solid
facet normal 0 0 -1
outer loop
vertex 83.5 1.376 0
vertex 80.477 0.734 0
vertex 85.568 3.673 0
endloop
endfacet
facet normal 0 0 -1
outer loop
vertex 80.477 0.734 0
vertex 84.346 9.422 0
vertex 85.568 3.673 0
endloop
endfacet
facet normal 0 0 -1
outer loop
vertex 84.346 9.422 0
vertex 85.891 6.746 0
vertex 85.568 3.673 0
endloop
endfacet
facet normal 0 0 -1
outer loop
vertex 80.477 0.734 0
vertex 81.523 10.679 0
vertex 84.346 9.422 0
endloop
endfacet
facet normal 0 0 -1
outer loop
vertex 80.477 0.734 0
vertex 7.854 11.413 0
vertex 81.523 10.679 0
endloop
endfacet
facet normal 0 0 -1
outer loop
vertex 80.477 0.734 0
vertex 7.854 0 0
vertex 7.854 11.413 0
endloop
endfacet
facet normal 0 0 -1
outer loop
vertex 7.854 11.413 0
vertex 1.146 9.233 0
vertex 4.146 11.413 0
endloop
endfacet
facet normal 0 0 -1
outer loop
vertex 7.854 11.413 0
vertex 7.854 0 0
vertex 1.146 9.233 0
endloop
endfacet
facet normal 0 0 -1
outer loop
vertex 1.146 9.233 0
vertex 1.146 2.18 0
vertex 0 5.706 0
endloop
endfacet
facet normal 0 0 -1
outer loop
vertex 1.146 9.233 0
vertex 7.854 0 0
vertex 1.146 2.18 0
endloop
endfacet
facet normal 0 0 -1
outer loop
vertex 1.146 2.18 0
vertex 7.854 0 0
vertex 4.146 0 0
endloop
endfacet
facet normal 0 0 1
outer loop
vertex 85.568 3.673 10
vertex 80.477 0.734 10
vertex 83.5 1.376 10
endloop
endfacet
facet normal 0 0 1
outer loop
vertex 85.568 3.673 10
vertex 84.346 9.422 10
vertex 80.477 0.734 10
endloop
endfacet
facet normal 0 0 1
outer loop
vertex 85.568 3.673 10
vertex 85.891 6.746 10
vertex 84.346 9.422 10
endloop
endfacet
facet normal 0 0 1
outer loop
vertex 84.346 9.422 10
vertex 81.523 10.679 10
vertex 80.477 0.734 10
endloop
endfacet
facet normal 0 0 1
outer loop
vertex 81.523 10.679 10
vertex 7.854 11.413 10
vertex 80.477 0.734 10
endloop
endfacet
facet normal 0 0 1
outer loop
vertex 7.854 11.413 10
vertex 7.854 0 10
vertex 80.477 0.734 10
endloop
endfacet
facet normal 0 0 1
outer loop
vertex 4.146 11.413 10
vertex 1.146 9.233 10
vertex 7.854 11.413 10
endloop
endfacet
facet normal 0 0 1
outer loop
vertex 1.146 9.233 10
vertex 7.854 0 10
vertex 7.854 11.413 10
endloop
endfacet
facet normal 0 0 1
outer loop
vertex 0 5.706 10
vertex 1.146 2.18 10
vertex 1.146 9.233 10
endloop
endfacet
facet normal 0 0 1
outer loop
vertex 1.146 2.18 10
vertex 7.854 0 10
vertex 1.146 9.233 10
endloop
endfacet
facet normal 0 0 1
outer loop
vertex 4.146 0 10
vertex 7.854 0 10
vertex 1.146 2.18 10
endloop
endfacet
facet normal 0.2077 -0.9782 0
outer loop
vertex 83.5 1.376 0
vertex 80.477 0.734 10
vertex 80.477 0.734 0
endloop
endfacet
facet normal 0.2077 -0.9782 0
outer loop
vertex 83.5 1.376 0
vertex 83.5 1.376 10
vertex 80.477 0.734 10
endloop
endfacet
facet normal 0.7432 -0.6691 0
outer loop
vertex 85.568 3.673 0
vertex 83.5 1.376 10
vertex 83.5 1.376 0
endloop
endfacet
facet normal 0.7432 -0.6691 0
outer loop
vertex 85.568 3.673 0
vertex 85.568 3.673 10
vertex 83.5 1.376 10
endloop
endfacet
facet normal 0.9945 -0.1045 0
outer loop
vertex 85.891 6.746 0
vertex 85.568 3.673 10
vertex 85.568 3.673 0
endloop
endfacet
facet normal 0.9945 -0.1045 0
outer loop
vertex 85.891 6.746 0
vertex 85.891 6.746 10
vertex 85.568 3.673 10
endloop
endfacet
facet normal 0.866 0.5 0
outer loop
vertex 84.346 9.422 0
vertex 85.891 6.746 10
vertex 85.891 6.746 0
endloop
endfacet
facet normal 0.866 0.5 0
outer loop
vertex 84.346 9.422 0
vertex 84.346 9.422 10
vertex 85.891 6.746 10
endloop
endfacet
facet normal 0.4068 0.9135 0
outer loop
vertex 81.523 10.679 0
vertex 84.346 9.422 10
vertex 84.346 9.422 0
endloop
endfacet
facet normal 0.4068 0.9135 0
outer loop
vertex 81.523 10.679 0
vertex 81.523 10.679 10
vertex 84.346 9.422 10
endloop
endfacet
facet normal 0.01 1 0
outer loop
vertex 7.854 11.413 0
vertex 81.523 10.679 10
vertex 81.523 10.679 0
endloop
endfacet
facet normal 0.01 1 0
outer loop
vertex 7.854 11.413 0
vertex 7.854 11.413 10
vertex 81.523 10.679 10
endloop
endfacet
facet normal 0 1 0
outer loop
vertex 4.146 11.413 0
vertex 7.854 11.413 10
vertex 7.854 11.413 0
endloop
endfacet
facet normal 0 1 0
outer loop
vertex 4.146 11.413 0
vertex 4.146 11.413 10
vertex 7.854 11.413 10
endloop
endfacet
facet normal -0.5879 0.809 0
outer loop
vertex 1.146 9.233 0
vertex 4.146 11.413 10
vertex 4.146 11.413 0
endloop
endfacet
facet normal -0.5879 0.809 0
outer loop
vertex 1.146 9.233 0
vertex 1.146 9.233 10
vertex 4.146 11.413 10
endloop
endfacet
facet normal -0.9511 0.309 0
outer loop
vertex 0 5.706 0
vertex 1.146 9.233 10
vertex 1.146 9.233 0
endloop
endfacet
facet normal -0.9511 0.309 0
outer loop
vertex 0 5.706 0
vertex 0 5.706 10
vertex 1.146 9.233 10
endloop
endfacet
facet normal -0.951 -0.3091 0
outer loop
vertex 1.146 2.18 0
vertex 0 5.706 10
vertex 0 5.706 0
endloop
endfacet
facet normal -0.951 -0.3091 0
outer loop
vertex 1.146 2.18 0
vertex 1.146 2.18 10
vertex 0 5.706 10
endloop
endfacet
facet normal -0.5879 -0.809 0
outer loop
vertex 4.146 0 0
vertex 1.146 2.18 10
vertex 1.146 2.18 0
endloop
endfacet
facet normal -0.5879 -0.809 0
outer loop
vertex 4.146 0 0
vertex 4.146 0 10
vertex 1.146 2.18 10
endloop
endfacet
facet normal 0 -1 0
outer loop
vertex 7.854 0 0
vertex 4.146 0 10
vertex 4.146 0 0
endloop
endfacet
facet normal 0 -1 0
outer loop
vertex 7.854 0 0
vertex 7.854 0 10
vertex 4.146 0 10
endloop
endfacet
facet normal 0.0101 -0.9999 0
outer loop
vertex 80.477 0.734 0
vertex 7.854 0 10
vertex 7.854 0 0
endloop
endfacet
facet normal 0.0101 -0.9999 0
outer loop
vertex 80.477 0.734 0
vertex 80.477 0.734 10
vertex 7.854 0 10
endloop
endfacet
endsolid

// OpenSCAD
$fn = 32;

// ----------------------------------------------------------------------
// Lever arm: two bosses 12 and 10 mm, 75 mm between centres
// ----------------------------------------------------------------------

// --- parameters (mm) ---
profile_height = 10;      // extrusion height
profile_points = 13;      // points of the closed outline

profile = [[0, 5.706], [1.146, 2.18], [4.146, 0], [7.854, 0], [80.477, 0.734], [83.5, 1.376], [85.568, 3.673], [85.891, 6.746], [84.346, 9.422], [81.523, 10.679], [7.854, 11.413], [4.146, 11.413], [1.146, 9.233]];  // single closed polygon, 13 points, counter clockwise

// --- the one profile operation ---
linear_extrude(height = profile_height) polygon(points = profile);
